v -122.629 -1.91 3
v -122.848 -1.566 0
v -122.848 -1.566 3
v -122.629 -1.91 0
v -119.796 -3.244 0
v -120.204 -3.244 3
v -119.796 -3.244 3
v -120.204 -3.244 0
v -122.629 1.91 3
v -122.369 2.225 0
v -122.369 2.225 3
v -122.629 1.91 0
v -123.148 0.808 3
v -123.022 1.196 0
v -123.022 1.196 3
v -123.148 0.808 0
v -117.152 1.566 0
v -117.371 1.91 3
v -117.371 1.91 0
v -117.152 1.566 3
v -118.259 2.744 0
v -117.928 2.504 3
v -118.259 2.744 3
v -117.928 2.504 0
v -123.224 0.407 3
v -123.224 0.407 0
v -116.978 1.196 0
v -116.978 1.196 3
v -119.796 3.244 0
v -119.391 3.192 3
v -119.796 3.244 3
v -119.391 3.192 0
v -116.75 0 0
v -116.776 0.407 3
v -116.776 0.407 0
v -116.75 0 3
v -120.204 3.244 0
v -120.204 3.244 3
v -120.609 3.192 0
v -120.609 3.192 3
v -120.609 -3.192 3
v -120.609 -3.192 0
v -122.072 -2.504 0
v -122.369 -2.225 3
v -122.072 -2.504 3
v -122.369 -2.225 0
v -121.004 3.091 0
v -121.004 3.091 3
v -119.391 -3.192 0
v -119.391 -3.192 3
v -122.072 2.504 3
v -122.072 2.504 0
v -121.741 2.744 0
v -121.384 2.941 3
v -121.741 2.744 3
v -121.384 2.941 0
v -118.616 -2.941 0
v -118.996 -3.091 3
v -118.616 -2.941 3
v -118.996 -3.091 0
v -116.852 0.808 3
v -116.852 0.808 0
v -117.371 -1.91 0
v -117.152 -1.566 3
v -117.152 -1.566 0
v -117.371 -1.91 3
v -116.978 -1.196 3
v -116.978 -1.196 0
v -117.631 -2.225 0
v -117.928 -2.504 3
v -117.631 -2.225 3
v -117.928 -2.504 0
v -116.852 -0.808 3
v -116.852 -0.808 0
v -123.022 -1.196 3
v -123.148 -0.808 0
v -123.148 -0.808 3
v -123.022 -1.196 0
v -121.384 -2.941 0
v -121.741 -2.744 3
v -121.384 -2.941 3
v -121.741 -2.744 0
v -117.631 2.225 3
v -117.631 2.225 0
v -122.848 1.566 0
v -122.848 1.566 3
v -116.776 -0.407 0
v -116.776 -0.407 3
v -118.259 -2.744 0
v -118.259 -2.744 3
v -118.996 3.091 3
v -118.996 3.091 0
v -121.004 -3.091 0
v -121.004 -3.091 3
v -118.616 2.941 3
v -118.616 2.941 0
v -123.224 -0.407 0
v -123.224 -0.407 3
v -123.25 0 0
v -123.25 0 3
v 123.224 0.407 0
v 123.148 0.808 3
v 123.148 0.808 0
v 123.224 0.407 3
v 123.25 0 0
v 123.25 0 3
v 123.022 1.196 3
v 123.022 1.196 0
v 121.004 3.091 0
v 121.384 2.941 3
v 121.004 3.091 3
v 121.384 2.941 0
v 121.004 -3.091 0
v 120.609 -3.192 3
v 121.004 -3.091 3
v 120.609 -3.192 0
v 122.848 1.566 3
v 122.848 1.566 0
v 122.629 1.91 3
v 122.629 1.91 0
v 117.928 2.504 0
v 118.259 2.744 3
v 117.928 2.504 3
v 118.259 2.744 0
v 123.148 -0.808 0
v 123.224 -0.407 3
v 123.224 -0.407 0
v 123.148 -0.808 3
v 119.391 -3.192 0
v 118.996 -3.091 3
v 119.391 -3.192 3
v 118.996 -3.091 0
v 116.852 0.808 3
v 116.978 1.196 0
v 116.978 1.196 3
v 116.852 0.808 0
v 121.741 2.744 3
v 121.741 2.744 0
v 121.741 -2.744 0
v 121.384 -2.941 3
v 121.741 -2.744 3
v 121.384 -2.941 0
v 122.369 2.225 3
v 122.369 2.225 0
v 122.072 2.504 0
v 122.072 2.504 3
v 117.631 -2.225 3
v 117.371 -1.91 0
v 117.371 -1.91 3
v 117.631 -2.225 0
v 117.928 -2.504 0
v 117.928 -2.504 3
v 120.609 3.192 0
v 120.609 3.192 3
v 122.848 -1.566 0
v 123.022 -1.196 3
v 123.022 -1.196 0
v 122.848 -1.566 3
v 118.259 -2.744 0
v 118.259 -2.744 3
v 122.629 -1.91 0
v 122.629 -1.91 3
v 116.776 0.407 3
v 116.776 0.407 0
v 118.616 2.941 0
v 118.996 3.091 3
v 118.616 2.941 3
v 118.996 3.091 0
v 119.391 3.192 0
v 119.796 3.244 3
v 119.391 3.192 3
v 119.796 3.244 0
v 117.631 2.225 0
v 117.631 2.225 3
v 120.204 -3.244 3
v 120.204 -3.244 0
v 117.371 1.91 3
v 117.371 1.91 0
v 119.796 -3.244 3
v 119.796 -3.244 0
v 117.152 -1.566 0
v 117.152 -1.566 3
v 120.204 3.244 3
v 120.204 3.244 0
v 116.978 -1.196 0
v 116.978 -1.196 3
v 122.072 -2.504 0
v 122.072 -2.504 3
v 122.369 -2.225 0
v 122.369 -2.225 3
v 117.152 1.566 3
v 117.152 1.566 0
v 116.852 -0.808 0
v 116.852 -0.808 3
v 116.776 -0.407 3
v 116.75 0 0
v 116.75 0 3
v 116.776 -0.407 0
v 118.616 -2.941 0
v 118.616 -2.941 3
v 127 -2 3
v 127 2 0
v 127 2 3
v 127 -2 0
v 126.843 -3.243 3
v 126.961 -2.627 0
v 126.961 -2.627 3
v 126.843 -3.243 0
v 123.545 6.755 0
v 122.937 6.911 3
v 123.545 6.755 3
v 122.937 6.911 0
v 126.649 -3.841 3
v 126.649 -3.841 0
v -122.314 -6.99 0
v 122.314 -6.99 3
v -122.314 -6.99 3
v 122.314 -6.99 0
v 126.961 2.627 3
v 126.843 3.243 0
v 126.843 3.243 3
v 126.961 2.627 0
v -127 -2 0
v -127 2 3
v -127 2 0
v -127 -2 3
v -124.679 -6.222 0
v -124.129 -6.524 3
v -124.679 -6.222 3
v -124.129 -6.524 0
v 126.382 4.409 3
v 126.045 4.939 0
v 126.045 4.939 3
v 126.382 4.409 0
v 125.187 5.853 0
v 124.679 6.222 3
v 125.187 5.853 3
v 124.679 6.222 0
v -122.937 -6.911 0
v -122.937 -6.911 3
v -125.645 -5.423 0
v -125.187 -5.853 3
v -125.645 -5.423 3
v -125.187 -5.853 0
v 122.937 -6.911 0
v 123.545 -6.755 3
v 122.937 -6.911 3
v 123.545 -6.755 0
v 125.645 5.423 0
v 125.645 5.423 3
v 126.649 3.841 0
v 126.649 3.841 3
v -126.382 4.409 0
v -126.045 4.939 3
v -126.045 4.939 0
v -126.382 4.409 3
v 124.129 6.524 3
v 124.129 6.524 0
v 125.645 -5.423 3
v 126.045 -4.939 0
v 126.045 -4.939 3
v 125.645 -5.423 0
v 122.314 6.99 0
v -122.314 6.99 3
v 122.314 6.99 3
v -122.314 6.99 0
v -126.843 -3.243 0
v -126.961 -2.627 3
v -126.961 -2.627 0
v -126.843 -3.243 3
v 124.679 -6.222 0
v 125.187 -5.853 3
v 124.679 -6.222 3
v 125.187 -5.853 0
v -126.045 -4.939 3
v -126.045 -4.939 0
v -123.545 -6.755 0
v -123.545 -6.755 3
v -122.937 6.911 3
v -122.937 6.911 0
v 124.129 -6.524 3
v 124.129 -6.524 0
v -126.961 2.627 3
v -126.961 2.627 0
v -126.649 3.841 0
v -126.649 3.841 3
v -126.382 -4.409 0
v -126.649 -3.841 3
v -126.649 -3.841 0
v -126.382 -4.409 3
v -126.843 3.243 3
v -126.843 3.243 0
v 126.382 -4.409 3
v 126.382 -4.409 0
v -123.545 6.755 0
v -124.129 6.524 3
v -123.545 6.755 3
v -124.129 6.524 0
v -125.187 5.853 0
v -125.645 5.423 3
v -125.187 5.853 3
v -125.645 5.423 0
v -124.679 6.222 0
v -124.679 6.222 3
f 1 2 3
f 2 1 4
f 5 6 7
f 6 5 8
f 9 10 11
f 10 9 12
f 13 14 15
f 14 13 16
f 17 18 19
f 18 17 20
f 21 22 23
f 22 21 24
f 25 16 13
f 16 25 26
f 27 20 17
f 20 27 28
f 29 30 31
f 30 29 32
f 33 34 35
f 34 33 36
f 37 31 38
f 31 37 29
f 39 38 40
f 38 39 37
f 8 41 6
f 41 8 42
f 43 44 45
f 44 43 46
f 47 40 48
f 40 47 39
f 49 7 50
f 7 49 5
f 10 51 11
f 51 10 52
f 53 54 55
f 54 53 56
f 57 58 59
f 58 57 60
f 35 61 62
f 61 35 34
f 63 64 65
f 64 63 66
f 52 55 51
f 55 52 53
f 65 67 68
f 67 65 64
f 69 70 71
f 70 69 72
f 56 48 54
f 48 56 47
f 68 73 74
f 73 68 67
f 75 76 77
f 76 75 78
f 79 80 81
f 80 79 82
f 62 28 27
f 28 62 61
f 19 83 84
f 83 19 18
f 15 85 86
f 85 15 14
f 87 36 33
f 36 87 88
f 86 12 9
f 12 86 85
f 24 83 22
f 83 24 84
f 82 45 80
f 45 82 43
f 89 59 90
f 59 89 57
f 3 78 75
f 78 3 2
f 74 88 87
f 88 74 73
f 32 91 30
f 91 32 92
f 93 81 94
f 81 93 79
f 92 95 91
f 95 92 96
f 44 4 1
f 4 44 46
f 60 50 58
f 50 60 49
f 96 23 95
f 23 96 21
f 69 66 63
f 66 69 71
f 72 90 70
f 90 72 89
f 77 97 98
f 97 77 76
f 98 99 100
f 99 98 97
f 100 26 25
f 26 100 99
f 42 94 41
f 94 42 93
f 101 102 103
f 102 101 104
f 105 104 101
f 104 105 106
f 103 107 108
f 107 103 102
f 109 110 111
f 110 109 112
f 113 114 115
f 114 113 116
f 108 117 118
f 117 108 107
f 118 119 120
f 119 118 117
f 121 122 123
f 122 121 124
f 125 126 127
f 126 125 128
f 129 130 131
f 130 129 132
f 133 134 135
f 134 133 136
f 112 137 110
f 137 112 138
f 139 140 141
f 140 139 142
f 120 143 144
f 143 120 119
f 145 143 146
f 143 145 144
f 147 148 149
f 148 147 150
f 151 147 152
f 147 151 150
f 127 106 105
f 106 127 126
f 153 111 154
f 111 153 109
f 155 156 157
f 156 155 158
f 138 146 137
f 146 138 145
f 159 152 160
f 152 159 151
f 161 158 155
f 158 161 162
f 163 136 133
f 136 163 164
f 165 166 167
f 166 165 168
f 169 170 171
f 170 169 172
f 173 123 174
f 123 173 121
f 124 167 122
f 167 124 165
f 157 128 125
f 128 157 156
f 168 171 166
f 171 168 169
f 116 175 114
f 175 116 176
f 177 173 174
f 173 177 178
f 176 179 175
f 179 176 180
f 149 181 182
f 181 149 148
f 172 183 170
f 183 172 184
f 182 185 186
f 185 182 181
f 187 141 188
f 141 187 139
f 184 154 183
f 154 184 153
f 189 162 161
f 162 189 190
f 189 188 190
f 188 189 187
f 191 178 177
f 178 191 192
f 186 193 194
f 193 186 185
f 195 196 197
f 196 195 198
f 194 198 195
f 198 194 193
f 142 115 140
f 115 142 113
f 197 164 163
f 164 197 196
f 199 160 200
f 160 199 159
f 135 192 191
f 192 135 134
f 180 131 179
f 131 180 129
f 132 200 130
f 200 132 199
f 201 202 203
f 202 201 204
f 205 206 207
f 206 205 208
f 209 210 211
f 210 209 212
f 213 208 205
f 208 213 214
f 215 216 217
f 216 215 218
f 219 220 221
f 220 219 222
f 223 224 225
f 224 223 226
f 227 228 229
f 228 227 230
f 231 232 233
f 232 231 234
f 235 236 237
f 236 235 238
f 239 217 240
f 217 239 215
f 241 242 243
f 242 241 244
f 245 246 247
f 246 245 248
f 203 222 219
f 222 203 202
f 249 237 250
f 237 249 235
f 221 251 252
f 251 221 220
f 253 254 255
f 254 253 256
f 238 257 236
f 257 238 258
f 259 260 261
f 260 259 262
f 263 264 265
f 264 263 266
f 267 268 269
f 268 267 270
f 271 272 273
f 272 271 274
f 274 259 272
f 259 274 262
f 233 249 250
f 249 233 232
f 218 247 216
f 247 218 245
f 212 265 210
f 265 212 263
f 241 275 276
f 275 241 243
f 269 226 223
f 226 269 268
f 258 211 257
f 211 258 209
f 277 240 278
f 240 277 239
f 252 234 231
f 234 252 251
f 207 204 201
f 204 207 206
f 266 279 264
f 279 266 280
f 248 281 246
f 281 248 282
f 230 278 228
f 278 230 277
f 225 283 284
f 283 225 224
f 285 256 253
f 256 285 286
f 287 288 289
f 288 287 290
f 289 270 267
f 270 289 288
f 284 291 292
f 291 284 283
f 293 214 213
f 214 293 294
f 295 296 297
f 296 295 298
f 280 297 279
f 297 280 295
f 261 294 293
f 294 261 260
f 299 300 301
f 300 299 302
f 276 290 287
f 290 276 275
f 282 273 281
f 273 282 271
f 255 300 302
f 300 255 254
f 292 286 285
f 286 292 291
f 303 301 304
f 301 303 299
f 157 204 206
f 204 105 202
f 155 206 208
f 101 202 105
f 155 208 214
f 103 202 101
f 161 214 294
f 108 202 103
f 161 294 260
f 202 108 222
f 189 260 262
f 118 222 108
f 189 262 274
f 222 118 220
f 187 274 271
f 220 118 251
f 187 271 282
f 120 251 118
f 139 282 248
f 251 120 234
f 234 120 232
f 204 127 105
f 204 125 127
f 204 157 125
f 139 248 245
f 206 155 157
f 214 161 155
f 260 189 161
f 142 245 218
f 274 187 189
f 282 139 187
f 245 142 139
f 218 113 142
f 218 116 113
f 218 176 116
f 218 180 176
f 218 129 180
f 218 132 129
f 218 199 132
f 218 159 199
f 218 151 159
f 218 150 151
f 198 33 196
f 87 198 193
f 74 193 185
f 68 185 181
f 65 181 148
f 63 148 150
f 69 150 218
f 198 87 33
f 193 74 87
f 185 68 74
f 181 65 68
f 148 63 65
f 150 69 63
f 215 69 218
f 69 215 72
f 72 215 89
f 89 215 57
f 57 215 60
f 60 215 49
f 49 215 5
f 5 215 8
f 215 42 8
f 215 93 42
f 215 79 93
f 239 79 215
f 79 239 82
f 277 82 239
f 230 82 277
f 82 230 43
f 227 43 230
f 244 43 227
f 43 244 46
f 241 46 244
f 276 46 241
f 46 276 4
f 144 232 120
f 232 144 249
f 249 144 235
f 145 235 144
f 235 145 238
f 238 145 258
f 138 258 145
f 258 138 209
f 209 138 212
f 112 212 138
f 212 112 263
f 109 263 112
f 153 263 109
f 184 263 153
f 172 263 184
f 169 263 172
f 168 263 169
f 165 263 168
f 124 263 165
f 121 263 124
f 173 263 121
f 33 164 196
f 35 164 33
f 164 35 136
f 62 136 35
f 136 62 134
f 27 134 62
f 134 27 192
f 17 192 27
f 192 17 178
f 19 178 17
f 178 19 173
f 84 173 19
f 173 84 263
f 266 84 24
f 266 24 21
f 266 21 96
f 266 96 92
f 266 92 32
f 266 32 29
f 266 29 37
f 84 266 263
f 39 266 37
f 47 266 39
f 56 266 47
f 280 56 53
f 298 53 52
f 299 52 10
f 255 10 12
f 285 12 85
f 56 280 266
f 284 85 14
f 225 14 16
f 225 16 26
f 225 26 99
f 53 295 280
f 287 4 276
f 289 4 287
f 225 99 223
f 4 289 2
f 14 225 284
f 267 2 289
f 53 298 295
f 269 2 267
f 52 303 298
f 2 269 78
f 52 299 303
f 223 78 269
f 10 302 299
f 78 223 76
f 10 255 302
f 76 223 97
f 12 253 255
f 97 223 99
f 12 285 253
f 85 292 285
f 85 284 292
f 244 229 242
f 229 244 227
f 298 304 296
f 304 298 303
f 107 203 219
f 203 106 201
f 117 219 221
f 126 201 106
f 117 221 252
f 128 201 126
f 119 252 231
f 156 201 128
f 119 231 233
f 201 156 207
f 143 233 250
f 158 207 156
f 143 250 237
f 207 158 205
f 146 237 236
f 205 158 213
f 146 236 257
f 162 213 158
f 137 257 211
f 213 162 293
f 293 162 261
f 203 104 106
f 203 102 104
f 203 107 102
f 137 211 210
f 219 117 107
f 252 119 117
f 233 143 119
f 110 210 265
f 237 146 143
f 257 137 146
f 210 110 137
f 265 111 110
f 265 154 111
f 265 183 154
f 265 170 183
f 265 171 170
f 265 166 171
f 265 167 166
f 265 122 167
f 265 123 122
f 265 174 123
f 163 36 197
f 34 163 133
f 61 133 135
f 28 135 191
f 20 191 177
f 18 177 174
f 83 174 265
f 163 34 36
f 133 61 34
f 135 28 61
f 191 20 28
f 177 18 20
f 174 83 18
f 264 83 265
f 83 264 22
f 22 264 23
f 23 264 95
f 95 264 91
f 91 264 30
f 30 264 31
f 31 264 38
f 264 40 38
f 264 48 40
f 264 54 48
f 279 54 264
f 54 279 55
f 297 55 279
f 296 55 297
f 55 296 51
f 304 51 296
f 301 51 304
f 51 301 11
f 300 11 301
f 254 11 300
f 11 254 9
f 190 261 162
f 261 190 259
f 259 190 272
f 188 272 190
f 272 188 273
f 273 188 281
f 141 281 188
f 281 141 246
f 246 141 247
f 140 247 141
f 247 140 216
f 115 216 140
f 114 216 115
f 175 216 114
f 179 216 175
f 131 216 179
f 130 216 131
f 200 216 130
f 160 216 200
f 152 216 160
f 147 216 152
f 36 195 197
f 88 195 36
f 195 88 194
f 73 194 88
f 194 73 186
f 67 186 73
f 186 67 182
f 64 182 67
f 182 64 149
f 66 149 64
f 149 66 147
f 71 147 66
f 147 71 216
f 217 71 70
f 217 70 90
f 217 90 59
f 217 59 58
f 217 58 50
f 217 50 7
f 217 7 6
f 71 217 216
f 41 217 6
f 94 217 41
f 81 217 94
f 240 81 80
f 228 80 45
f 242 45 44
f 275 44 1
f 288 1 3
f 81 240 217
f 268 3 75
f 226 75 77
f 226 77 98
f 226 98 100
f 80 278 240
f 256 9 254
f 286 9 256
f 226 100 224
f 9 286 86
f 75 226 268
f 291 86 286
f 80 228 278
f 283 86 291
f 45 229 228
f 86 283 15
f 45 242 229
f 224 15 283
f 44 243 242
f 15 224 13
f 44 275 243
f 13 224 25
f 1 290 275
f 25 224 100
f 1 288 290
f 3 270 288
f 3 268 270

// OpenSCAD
$fn = 50;


difference() {
	union() {
		hull() {
			translate(v = [-122.0000000000, 2.0000000000, 0]) {
				cylinder(h = 3, r = 5);
			}
			translate(v = [122.0000000000, 2.0000000000, 0]) {
				cylinder(h = 3, r = 5);
			}
			translate(v = [-122.0000000000, -2.0000000000, 0]) {
				cylinder(h = 3, r = 5);
			}
			translate(v = [122.0000000000, -2.0000000000, 0]) {
				cylinder(h = 3, r = 5);
			}
		}
	}
	union() {
		translate(v = [-120.0000000000, 0.0000000000, -100.0000000000]) {
			cylinder(h = 200, r = 3.2500000000);
		}
		translate(v = [-120.0000000000, 0.0000000000, -100.0000000000]) {
			cylinder(h = 200, r = 3.2500000000);
		}
		translate(v = [120.0000000000, 0.0000000000, -100.0000000000]) {
			cylinder(h = 200, r = 3.2500000000);
		}
		translate(v = [120.0000000000, 0.0000000000, -100.0000000000]) {
			cylinder(h = 200, r = 3.2500000000);
		}
	}
}
